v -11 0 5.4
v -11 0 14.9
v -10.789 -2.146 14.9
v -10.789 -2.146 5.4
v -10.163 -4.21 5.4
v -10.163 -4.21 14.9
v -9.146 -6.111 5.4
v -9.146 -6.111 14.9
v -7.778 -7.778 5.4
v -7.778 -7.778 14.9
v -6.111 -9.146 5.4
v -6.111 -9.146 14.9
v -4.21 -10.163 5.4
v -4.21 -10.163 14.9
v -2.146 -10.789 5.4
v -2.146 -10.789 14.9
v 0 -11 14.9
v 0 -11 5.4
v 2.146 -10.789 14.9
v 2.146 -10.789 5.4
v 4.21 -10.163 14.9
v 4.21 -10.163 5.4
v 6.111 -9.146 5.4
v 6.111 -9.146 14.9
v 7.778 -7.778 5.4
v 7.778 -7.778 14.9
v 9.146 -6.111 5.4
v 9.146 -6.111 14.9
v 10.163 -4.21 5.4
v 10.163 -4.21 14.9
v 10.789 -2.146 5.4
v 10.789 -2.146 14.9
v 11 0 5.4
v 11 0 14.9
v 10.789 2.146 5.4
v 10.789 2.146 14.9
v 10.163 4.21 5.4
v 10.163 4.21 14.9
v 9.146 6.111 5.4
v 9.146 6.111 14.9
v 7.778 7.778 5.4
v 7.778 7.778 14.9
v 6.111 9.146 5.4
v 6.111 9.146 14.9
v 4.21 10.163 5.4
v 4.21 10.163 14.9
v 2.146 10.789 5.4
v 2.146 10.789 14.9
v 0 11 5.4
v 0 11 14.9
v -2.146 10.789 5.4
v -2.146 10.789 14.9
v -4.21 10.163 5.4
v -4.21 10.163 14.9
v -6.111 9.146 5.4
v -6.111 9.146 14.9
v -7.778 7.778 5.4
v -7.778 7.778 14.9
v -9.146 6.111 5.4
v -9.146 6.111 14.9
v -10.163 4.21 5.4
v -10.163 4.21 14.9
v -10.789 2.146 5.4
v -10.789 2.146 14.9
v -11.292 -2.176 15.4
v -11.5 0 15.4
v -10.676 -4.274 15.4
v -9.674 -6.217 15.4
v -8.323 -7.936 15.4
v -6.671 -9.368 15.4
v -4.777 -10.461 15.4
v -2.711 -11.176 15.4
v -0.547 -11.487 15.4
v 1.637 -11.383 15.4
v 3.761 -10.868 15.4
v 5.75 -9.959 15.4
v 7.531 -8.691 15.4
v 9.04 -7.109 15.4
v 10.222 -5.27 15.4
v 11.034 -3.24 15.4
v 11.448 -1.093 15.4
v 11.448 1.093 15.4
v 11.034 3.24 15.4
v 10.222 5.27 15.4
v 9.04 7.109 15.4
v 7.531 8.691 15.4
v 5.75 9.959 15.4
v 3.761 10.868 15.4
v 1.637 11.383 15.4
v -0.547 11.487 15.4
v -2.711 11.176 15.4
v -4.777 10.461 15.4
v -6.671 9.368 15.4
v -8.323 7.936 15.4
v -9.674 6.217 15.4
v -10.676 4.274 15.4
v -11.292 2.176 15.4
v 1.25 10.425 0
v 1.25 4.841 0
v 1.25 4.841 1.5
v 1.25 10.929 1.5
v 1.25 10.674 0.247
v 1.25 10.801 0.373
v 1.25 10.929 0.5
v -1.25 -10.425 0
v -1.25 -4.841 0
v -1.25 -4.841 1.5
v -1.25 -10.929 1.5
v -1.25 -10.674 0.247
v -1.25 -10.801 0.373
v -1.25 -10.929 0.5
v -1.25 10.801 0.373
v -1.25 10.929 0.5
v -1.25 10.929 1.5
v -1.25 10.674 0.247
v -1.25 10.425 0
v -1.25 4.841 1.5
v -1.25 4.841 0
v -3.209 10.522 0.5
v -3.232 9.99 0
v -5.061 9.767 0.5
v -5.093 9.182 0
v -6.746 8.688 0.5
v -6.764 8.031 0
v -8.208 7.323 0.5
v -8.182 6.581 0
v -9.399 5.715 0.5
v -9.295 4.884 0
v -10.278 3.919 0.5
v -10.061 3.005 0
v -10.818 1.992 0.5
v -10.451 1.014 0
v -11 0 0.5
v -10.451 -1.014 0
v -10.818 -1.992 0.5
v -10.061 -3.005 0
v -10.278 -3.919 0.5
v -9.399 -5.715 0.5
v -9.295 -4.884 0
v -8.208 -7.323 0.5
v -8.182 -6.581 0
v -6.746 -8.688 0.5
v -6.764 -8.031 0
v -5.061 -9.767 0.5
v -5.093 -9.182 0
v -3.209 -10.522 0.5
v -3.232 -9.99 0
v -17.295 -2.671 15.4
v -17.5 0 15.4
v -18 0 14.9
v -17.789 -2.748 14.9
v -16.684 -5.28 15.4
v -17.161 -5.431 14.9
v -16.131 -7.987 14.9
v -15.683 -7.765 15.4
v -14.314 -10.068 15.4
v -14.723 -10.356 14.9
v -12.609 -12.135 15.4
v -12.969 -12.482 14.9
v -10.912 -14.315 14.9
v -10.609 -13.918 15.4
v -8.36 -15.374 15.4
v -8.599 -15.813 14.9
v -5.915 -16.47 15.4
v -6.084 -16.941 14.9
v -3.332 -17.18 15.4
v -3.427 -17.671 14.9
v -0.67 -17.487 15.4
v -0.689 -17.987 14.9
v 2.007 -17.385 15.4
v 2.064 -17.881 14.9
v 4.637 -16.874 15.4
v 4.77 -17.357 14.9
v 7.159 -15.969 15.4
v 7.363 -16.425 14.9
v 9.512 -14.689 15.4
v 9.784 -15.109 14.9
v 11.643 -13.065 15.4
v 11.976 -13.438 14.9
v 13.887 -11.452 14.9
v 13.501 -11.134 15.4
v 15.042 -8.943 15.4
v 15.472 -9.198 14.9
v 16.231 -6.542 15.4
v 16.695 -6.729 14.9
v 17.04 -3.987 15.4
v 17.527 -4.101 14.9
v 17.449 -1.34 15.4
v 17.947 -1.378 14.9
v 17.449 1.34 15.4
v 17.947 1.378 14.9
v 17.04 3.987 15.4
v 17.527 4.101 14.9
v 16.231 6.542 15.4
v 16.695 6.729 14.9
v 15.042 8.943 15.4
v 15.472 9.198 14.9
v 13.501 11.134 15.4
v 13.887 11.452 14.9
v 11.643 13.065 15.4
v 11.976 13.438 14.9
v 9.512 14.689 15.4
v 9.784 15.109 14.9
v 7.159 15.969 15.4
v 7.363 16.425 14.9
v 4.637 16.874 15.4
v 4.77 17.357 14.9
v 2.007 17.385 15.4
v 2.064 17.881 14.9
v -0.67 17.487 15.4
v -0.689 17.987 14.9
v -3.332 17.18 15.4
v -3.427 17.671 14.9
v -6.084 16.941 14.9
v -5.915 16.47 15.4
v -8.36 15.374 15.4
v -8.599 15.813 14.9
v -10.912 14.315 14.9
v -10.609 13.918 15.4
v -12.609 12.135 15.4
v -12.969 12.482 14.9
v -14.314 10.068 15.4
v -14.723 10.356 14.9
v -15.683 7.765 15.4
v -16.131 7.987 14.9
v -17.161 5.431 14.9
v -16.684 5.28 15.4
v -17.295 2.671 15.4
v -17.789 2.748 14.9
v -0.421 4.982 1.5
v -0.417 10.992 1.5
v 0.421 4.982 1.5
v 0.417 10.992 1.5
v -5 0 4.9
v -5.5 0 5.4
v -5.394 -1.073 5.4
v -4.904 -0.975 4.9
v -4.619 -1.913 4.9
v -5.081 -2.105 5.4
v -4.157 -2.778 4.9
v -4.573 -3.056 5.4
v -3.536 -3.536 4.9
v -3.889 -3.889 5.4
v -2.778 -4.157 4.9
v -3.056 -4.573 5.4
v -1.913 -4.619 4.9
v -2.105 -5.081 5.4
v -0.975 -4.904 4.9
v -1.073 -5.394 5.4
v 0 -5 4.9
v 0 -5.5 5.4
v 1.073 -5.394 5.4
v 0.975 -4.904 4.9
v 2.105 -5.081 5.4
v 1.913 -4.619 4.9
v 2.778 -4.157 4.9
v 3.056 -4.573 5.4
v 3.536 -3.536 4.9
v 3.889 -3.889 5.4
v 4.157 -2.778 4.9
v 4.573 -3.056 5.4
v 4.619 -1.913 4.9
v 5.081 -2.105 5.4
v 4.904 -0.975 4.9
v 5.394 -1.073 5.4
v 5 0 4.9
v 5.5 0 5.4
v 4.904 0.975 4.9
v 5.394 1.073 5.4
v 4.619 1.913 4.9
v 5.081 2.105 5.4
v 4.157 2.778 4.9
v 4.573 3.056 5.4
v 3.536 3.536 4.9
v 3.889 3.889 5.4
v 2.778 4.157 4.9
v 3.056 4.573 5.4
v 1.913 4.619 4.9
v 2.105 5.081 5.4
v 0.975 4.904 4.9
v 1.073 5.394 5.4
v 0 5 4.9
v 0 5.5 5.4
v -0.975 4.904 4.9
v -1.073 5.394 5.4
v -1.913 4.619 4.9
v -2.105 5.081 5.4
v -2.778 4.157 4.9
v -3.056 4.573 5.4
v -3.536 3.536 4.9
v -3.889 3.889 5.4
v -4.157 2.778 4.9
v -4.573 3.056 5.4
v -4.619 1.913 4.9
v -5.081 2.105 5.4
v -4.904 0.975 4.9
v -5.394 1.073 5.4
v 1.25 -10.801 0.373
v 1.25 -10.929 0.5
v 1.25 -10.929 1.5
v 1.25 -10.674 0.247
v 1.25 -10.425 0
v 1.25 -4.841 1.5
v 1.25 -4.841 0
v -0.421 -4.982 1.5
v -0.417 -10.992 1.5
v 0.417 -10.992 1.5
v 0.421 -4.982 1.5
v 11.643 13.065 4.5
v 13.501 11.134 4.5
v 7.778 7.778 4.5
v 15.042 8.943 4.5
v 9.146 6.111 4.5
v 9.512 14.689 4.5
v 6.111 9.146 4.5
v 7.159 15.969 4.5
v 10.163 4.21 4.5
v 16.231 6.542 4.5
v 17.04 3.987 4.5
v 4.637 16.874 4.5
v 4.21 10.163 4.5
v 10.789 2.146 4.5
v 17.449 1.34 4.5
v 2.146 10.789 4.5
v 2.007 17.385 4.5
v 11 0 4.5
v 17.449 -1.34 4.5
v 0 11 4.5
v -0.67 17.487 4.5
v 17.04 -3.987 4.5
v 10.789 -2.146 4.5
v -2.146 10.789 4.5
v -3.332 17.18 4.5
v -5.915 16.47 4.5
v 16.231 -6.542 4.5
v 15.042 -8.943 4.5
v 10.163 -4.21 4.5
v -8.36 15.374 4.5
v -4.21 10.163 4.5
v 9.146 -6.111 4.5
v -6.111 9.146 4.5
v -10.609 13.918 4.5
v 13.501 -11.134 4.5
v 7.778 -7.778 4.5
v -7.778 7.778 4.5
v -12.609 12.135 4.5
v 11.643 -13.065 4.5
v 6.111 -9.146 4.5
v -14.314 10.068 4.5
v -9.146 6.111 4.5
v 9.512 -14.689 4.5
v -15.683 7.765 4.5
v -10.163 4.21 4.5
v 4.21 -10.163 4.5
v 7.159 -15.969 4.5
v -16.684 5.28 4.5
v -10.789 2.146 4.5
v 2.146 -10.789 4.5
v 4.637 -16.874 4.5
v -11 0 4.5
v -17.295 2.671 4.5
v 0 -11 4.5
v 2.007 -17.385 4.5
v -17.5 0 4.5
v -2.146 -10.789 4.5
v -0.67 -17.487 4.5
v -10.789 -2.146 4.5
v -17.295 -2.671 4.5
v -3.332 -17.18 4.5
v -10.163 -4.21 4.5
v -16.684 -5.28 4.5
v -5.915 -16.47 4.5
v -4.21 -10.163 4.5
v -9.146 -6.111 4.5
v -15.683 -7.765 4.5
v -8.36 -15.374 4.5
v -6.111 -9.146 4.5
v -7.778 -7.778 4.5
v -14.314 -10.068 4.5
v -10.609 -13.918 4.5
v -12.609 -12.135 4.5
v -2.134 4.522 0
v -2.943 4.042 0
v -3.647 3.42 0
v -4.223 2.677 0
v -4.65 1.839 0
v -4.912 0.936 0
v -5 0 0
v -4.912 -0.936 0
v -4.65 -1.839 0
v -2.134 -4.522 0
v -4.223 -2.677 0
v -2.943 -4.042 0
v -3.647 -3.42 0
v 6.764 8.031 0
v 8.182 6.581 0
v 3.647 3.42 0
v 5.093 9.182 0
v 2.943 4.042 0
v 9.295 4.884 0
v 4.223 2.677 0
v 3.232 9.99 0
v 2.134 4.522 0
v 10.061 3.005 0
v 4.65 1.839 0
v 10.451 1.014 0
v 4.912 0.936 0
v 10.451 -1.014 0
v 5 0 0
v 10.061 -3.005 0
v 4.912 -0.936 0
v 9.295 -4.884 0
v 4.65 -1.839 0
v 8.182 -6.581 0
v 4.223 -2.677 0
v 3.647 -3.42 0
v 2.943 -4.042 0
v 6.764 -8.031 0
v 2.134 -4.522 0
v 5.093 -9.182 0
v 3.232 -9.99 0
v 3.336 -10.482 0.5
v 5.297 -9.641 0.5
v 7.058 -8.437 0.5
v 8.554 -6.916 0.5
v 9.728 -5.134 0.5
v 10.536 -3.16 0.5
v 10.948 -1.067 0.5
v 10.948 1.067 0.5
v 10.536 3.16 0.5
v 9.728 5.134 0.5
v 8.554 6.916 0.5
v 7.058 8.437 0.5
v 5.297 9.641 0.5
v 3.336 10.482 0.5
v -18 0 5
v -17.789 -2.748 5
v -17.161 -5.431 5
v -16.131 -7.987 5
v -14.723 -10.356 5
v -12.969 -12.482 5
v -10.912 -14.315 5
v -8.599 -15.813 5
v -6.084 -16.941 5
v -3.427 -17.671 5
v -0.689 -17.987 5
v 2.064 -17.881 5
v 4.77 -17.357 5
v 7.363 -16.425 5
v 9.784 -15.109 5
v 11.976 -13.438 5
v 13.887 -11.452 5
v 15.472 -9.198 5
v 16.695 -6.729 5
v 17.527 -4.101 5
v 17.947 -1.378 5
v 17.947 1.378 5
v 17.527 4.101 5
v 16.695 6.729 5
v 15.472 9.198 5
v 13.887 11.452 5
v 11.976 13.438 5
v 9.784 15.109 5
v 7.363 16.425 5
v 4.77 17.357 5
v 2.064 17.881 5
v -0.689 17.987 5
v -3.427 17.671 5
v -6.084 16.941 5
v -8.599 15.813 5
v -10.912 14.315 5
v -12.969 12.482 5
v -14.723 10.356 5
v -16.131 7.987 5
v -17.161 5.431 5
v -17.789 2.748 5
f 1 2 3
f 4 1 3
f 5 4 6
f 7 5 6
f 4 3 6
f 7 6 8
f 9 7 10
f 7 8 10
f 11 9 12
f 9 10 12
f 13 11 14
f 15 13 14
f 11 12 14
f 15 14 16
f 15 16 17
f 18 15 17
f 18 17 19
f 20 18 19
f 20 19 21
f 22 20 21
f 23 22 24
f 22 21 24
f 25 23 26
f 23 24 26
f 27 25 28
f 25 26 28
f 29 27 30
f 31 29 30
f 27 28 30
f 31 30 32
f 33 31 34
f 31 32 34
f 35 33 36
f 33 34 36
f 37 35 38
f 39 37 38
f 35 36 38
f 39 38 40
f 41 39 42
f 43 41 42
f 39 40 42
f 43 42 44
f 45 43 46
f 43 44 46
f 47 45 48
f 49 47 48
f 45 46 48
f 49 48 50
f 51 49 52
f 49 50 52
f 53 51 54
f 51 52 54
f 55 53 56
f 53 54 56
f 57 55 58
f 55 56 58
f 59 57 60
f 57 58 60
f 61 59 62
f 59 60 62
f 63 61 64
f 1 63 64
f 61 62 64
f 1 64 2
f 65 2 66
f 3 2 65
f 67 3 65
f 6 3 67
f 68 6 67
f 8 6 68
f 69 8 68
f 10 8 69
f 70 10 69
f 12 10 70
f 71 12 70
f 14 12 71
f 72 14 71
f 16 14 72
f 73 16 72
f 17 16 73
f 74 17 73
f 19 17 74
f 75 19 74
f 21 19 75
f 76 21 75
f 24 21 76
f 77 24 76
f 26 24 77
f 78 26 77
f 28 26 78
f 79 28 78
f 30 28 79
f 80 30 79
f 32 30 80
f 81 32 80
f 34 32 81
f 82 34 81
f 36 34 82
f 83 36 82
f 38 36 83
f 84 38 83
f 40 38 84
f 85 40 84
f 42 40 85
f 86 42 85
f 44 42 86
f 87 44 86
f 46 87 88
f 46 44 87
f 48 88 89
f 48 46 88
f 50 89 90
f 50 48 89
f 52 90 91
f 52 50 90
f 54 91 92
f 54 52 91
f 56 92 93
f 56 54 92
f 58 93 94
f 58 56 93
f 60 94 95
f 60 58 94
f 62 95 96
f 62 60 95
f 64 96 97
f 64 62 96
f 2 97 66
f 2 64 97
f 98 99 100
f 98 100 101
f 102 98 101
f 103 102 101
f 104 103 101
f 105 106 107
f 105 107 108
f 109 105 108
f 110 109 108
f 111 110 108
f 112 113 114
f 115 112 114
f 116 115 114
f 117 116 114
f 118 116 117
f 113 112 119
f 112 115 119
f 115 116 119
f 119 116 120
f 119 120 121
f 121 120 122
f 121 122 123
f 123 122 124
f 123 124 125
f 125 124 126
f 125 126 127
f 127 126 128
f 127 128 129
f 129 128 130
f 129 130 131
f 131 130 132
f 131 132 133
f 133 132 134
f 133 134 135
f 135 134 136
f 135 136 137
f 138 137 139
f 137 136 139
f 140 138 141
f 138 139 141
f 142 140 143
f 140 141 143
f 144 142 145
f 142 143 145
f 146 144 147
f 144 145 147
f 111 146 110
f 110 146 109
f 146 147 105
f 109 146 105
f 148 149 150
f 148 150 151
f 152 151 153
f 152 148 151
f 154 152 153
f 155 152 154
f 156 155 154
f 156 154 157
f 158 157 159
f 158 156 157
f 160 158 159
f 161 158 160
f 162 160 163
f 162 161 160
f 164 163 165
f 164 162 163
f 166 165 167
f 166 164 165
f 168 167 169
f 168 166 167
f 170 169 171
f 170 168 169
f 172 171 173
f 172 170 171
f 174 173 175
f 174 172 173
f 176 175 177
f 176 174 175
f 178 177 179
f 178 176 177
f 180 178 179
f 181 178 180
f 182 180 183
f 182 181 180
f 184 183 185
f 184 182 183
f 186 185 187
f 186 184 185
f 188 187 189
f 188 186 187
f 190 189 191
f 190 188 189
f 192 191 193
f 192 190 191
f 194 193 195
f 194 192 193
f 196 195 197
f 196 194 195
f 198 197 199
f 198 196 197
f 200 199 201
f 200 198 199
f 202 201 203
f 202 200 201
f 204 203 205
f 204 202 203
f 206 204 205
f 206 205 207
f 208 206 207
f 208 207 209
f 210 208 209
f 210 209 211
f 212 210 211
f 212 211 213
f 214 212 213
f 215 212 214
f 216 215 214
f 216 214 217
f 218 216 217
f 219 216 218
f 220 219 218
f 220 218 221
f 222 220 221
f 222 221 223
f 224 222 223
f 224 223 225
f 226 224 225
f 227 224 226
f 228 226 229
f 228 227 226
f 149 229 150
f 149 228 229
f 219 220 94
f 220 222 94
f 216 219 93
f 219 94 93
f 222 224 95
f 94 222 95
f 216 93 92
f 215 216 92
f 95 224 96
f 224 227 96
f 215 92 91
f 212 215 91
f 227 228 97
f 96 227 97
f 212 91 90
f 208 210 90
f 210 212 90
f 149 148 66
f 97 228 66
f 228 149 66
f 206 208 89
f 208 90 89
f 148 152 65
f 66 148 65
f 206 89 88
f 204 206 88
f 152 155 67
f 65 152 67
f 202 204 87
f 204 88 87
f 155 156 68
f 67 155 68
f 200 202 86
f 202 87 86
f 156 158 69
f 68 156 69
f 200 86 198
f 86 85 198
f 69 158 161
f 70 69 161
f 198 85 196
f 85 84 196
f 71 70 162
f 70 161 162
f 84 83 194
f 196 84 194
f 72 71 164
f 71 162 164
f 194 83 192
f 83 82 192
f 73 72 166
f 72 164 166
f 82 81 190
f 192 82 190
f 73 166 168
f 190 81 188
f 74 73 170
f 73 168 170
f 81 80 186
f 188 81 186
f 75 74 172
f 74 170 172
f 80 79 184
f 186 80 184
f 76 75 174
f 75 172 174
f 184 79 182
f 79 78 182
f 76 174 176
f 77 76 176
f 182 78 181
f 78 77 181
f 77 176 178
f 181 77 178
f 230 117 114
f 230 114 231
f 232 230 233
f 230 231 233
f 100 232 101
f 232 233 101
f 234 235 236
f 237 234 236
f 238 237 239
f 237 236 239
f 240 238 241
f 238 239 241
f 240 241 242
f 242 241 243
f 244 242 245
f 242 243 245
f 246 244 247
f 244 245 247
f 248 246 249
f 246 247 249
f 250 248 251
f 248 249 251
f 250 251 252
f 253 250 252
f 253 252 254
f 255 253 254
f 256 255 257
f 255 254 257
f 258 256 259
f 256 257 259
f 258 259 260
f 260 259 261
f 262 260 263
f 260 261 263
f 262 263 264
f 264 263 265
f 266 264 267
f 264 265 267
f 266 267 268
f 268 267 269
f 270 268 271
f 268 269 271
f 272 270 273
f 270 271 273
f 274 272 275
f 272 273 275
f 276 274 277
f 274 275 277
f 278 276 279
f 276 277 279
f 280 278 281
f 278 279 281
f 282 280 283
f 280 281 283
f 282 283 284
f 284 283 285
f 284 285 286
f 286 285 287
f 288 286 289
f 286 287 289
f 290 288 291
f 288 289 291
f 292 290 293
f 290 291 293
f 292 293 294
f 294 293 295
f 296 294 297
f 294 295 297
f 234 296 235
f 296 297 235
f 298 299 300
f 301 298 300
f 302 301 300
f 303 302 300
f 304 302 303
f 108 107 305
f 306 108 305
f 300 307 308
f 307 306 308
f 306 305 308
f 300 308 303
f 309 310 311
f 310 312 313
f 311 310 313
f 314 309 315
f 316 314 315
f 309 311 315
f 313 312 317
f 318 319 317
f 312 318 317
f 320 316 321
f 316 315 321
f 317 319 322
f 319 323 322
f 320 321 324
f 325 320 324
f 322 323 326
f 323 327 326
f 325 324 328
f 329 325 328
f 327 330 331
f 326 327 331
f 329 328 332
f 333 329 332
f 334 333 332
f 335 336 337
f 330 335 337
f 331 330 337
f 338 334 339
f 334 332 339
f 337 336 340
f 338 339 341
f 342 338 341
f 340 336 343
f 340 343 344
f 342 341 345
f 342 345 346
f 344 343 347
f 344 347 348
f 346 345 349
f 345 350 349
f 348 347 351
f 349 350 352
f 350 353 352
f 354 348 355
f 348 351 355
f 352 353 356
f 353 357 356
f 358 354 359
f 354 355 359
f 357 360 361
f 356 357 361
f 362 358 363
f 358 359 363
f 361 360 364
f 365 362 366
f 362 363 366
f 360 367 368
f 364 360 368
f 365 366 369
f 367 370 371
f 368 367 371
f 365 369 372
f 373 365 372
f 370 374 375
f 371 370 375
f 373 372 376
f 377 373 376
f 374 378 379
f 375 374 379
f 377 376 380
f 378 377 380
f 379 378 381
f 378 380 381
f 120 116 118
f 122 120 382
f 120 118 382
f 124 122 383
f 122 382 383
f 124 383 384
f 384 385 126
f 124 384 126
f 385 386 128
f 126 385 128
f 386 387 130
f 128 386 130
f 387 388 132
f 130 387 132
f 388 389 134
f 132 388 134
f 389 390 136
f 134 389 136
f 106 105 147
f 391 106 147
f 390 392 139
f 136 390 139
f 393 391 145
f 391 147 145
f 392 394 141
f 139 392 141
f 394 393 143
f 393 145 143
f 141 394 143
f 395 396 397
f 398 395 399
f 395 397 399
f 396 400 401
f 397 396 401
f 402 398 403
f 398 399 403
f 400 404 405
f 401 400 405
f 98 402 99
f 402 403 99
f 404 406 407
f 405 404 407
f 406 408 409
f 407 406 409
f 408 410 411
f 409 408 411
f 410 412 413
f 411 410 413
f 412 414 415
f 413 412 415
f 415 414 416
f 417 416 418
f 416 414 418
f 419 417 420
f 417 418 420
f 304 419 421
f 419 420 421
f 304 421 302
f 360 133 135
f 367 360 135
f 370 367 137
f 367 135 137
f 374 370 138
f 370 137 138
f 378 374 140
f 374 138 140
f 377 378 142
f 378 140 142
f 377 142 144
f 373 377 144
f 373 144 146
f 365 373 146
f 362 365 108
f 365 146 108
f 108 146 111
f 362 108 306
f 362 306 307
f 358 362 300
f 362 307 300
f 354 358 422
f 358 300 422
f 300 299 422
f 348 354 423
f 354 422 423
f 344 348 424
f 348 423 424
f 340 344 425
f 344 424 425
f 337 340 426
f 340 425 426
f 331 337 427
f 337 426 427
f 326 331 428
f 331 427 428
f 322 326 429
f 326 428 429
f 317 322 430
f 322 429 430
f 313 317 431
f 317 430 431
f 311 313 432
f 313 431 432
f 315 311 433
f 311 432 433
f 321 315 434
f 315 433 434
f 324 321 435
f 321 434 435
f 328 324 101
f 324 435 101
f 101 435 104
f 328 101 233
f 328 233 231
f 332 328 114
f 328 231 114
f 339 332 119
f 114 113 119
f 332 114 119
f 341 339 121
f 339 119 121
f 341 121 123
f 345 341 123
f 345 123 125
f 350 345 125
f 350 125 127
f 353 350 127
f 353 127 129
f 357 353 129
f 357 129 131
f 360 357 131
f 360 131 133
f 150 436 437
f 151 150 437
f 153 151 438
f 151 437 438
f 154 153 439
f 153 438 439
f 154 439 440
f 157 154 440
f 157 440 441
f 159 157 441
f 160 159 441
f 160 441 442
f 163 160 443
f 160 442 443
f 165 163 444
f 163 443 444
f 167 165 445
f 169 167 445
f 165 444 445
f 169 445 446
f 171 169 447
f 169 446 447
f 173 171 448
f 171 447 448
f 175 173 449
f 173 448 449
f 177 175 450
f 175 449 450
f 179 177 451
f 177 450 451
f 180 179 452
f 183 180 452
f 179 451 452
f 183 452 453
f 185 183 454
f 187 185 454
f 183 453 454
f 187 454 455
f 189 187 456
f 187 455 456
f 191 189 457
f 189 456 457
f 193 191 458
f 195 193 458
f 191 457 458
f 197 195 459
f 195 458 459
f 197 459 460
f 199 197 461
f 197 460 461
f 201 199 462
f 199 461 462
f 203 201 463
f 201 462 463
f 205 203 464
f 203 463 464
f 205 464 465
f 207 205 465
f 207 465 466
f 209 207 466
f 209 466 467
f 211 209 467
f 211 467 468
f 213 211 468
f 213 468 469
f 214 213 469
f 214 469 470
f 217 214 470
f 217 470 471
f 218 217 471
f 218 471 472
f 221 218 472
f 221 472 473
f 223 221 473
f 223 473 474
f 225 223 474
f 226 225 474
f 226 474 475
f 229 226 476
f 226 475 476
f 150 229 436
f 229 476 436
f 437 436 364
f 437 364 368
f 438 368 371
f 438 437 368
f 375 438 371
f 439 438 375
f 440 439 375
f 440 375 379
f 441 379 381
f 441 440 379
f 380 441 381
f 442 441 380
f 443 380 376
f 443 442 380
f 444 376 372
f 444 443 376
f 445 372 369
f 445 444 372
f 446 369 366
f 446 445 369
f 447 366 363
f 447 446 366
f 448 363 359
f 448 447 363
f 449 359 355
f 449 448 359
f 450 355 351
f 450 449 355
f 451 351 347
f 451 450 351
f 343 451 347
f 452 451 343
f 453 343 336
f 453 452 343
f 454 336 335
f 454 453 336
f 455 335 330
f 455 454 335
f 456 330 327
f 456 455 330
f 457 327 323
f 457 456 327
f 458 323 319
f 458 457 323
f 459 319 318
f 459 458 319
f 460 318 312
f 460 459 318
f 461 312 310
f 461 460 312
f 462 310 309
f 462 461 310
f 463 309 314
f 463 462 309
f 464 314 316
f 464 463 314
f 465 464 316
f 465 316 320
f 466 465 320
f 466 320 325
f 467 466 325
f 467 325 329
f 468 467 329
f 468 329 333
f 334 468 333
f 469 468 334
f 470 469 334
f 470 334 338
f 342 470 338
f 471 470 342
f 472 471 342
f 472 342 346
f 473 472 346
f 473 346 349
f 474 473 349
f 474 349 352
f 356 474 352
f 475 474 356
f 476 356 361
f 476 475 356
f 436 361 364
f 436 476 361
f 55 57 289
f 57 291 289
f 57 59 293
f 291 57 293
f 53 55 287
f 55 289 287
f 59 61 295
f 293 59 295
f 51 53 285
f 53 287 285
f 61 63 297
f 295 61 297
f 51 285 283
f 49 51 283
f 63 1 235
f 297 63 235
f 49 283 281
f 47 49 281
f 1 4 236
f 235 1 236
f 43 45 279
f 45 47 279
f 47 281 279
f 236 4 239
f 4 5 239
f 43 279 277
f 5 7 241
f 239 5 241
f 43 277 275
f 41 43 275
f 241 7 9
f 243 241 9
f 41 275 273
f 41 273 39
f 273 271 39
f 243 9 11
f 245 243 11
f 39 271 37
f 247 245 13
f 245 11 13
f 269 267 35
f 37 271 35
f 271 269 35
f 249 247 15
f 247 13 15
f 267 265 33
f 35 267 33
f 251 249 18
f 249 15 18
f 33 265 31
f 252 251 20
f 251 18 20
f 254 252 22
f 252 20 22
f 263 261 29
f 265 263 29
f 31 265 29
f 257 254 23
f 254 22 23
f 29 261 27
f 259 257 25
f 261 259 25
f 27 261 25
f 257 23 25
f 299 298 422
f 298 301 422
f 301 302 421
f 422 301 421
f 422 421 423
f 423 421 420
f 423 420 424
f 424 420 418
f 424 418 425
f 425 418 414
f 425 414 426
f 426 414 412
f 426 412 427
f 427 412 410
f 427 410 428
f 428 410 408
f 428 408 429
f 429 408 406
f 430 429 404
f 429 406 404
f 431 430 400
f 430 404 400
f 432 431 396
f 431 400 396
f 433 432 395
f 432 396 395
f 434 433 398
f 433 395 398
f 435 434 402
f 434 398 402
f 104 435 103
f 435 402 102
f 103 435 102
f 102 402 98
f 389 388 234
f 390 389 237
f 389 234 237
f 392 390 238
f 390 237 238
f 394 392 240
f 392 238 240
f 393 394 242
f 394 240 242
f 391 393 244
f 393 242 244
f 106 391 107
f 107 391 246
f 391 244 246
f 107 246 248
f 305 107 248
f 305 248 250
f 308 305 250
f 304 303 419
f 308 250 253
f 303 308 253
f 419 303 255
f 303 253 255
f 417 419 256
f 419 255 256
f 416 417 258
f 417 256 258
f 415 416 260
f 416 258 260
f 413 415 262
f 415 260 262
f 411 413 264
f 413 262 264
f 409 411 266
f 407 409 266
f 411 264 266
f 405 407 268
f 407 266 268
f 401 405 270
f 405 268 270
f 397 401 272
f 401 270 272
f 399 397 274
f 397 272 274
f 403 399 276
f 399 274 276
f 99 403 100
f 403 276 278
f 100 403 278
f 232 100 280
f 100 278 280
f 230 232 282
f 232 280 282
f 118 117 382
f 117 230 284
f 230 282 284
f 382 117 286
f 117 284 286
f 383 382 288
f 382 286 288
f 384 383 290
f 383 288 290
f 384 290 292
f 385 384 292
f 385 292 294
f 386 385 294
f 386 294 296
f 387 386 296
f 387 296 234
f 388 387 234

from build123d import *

# Parameters (mm, degrees)
CUT_EXTRUDE1_DEPTH = 1.5
CHAMFER1_SIZE      = 0.5


with BuildPart() as part:
    # Sketch2 → Revolve1 (revolve)
    with BuildSketch(Plane(origin=(0, 0, 0), x_dir=(1, 0, 0), z_dir=(0, 1, 0))):
        Polygon((-18, -4.5), (-11, -4.5), (-11, 0), (-5, 0), (-5, -5.4), (-11, -5.4), (-11, -15.4), (-18, -15.4), align=None)
    revolve(axis=Axis((0, 0, 0), (0, 0, 1)))

    # Sketch3 → Cut-Extrude1 (cut)
    with BuildSketch(Plane(origin=(0, 0, 0), x_dir=(-1, 0, 0), z_dir=(0, 0, -1))):
        with BuildLine():
            Line((1.25, 10.940968966), (1.25, 4.841229183))
            ThreePointArc((1.25, 4.841229183), (0, 5), (-1.25, 4.841229183))
            Line((-1.25, 4.841229183), (-1.25, 10.940968966))
            ThreePointArc((-1.25, 10.940968966), (0, 11.012143385), (1.25, 10.940968966))
        make_face()
        with BuildLine():
            Line((1.25, -4.841229183), (1.25, -10.940968966))
            ThreePointArc((1.25, -10.940968966), (0, -11.012143385), (-1.25, -10.940968966))
            Line((-1.25, -10.940968966), (-1.25, -4.841229183))
            ThreePointArc((-1.25, -4.841229183), (0, -5), (1.25, -4.841229183))
        make_face()
    extrude(amount=-CUT_EXTRUDE1_DEPTH, mode=Mode.SUBTRACT)

    # Chamfer1
    chamfer1_edges = [part.edges().sort_by_distance(p)[0] for p in [
        (11, 0, 0),
        (-8.20822758, -7.322909258, 0),
        (18, 0, 15.4),
        (18, 0, 4.5),
        (5, 0, 5.4),
        (11, 0, 15.4),
    ]]
    chamfer(chamfer1_edges, length=CHAMFER1_SIZE)


solid = part.part
